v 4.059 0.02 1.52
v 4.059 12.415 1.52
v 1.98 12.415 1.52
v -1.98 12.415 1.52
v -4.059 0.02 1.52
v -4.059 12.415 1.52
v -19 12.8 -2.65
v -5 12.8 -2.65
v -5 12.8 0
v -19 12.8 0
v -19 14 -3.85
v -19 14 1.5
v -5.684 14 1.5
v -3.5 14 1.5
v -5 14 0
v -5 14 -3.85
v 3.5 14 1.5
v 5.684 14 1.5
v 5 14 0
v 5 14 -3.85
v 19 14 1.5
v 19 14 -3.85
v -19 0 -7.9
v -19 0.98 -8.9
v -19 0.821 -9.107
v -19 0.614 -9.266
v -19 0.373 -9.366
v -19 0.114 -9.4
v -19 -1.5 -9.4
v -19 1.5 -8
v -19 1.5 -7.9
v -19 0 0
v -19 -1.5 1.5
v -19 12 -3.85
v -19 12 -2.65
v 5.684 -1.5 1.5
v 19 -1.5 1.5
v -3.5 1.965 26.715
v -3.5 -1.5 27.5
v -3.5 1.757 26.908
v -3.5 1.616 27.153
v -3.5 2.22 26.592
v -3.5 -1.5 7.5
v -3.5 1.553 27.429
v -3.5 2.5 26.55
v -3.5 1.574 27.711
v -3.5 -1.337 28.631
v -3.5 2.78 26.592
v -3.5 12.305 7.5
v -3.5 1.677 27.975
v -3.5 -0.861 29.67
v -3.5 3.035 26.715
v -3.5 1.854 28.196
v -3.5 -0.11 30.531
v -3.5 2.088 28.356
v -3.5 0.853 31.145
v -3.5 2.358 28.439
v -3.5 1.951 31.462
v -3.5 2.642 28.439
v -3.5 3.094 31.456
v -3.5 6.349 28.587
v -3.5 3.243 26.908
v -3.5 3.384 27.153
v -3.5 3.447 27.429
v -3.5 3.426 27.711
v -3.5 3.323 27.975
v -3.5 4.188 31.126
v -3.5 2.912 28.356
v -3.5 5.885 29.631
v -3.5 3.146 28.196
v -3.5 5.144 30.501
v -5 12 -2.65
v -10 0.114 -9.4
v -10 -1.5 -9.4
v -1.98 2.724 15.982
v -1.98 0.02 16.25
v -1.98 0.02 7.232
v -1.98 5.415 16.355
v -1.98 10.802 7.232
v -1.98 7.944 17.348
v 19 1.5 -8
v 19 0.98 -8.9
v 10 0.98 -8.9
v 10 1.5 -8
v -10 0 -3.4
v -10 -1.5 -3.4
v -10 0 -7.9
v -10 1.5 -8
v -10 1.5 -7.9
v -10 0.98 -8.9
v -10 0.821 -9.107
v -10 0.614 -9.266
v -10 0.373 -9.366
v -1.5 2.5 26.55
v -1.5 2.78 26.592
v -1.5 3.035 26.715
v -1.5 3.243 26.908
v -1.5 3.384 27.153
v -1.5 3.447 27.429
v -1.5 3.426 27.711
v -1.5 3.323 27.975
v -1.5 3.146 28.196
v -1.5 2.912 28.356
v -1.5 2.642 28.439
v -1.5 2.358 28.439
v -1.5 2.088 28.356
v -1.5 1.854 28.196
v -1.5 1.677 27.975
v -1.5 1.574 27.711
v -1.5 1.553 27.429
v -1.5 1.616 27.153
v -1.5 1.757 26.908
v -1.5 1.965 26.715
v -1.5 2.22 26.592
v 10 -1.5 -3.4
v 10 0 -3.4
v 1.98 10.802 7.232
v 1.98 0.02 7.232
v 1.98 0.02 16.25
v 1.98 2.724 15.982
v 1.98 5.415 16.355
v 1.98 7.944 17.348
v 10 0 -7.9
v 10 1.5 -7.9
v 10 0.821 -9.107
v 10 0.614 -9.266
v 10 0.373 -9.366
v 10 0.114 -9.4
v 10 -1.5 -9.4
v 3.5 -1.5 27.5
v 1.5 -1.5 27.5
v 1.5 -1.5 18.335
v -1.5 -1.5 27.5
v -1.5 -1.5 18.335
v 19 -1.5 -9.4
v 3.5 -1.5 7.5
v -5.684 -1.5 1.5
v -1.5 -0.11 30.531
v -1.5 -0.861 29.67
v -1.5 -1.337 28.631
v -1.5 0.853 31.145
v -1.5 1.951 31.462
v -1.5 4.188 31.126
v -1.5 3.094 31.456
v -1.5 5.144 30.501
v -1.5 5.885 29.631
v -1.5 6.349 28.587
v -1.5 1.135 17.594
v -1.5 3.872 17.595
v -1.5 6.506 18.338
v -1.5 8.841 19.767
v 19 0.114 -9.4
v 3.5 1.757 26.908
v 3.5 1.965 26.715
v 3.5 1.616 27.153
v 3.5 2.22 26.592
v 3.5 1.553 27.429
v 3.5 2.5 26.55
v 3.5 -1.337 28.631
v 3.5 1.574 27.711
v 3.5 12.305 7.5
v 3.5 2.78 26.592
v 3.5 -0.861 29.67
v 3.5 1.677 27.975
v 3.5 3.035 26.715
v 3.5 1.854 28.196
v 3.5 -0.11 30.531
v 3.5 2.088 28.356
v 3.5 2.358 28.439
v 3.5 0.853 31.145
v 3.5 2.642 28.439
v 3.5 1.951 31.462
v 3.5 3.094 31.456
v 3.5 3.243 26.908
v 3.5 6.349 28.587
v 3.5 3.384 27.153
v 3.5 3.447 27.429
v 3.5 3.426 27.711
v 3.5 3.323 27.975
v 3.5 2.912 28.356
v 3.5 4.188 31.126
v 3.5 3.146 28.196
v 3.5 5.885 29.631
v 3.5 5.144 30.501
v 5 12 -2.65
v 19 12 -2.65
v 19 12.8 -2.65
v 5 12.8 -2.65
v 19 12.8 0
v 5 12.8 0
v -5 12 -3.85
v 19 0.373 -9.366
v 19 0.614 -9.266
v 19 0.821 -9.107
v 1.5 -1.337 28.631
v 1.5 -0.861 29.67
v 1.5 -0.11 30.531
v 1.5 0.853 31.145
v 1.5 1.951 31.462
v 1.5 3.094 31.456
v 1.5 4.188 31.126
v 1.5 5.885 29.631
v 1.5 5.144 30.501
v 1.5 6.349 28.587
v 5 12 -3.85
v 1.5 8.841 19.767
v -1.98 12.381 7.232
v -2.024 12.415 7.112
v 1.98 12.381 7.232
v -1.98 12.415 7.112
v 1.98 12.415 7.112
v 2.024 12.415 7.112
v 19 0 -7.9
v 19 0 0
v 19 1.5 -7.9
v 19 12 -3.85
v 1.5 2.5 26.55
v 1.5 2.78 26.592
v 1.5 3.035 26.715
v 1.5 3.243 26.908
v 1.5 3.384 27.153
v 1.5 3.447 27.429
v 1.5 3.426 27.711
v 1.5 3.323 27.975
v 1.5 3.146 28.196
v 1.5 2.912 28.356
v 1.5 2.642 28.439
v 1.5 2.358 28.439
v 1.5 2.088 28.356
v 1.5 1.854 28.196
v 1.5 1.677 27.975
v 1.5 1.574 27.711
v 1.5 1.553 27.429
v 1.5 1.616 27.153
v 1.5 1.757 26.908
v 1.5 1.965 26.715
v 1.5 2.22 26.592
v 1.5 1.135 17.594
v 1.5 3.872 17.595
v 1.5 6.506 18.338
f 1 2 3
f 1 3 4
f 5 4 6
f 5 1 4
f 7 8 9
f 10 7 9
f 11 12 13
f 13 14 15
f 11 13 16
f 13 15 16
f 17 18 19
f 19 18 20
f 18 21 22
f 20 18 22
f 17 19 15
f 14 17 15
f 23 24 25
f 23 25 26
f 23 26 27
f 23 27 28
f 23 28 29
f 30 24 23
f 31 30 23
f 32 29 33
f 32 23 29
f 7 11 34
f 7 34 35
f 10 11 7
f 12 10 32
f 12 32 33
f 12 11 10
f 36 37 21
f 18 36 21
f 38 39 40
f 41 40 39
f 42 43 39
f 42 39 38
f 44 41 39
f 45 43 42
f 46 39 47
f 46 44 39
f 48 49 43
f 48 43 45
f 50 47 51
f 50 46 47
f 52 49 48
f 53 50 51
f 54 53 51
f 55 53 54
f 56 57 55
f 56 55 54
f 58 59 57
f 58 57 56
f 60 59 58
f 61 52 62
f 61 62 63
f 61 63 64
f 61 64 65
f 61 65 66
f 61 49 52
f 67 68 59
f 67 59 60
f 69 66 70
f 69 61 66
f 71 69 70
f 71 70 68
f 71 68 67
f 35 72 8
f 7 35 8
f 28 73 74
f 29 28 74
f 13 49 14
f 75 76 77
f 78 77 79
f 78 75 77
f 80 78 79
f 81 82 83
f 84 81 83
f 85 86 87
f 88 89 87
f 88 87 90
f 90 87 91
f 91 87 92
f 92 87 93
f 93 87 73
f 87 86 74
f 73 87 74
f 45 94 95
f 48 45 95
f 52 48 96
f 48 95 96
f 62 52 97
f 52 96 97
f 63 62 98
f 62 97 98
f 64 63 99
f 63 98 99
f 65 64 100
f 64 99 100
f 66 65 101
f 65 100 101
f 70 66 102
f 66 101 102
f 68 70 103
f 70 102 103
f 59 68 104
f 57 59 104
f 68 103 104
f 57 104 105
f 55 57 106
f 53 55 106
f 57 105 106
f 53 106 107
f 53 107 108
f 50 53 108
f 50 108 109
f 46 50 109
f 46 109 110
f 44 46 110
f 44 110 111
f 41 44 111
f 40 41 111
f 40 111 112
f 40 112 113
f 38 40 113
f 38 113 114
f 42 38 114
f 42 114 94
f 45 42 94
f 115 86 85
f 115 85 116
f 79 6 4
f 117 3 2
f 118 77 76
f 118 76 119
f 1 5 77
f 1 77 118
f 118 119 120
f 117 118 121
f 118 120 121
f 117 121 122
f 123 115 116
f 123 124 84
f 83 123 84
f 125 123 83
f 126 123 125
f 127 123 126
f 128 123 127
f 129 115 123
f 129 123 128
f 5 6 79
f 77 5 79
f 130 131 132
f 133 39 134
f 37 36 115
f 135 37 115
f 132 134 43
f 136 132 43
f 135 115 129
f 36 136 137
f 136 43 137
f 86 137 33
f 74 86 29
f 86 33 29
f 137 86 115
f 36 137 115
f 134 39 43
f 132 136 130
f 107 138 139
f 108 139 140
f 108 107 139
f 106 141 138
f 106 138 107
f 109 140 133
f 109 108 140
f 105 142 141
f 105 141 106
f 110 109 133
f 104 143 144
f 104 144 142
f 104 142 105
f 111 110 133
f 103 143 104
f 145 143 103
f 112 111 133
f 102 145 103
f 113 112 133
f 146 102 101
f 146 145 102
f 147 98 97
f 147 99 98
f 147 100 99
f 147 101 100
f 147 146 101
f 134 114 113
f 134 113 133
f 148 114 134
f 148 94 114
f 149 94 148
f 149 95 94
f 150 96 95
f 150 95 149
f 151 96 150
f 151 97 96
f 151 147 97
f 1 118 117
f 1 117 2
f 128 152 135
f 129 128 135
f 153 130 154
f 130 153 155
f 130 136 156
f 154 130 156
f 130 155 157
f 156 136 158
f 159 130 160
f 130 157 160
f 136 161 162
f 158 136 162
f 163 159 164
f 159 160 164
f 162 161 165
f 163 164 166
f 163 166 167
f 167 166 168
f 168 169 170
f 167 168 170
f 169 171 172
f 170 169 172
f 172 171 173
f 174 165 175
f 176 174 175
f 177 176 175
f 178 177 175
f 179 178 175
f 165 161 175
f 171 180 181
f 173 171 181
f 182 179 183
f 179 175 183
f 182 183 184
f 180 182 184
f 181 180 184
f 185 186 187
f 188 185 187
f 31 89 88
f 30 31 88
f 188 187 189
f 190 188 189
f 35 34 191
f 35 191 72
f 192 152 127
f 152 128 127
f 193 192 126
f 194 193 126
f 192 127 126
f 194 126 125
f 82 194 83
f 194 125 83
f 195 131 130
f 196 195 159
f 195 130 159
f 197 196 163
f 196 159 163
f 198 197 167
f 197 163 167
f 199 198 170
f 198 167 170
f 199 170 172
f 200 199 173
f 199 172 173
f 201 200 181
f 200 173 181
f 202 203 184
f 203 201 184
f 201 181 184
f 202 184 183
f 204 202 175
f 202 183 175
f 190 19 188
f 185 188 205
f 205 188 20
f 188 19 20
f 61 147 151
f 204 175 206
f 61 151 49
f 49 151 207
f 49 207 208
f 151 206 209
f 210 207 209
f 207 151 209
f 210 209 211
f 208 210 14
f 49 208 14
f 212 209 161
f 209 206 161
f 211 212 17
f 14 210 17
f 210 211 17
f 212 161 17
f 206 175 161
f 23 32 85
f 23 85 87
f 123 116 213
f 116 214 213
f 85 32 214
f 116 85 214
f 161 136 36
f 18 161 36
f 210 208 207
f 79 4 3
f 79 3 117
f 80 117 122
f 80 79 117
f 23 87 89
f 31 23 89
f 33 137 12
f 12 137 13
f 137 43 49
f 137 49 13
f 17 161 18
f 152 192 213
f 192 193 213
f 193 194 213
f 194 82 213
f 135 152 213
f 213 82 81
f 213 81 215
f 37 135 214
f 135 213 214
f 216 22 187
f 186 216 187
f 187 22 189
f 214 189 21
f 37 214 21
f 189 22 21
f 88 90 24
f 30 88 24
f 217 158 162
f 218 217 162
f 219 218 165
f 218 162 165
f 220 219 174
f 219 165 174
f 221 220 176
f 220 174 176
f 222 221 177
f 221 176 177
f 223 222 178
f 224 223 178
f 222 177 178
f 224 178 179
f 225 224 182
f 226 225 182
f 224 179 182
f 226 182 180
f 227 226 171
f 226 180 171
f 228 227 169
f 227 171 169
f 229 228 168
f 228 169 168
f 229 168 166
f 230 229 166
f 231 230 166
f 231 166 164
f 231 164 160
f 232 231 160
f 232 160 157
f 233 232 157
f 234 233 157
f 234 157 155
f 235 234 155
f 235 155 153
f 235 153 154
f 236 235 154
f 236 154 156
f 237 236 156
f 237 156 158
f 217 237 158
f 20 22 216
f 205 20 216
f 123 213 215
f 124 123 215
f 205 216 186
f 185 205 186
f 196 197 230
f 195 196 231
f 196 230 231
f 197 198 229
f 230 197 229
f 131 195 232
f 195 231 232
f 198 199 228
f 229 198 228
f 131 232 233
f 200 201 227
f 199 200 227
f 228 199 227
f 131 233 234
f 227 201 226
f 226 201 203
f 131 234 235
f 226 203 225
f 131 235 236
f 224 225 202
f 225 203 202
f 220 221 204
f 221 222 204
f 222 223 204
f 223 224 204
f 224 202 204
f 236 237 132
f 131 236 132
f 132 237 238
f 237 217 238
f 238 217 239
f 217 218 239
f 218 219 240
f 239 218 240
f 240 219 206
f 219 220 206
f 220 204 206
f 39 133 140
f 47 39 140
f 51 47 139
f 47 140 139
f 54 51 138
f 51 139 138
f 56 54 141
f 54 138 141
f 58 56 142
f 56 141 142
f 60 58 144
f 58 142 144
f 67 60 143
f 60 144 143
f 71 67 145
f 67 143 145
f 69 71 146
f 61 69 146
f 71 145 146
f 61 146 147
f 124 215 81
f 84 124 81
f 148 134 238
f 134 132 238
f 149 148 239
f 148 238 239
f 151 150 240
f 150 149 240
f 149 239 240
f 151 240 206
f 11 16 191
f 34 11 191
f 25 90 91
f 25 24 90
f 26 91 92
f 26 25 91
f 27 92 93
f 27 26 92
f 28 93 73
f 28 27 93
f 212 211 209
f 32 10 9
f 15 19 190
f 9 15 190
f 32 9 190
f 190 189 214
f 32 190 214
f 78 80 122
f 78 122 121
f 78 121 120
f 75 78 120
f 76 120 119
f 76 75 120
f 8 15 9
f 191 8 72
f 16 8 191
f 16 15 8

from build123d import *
from OCP.BRepFilletAPI import BRepFilletAPI_MakeChamfer

# Parameters (mm, degrees)
EXTRUDE_1_DEPTH     = 19
CUT_EXTRUDE_1_REACH = 28.26
SKETCH_6_W          = 20
SKETCH_6_H          = 6
CHAMFER_1_SIZE      = 1.4
CHAMFER_1_SIZE2     = 0.808290377
CUT_EXTRUDE_3_REACH = 28.26
SKETCH_9_W          = 10
SKETCH_9_H          = 3.85
FILLET_4_R          = 1
EXTRUDE_4_DEPTH     = 3.5
SKETCH_11_R         = 10
CUT_EXTRUDE_4_DEPTH = 1.5
CHAMFER_2_SIZE      = 6
CHAMFER_2_SIZE_2    = 2.183821406
SHELL_START         = -1.98
SHELL_4_DEPTH       = 3.96
SHELL_START_2       = 0.02
SHELL_4_2_DEPTH     = 12.394886134
SHELL_START_3       = 12.360630137
SHELL_4_3_DEPTH     = 1.52
SKETCH_12_R         = 0.95
CUT_EXTRUDE_5_DEPTH = 42.164304926


with BuildPart() as part:
    # 草圖1 → 填料-伸長1 (new, symmetric)
    with BuildSketch(Plane(origin=(0, 0, 0), x_dir=(0, 0, -1), z_dir=(1, 0, 0))):
        Polygon((0, 12.8), (0, 0), (7.9, 0), (7.9, 1.5), (9.4, 1.5), (9.4, -1.5), (-1.5, -1.5), (-1.5, 14), (3.85, 14), (3.85, 12), (2.65, 12), (2.65, 12.8), align=None)
    extrude(amount=EXTRUDE_1_DEPTH, both=True)

    # 草圖6 → 除料-伸長1 (cut, up to next)
    with BuildSketch(Plane(origin=(0, -1.5, 0), x_dir=(1, 0, 0), z_dir=(0, 1, 0)), mode=Mode.PRIVATE) as cut_extrude_1_sk1:
        with Locations((0, 6.4)):
            Rectangle(SKETCH_6_W, SKETCH_6_H)
    cut_extrude_1_tool1 = extrude(cut_extrude_1_sk1.sketch, amount=CUT_EXTRUDE_1_REACH, mode=Mode.PRIVATE) & part.part
    add(cut_extrude_1_tool1.solids().sort_by_distance((0, -1.5, -6.4))[0], mode=Mode.SUBTRACT)

    # 導角1: one chamfer whose edges measure the first distance from different faces: ONE call of the kernel's chamfer builder (chamfer() names one face for all edges)
    chamfer_1_edges_1 = [part.edges().sort_by_distance(p)[0] for p in [
        (14.5, 1.5, -9.4),
    ]]
    chamfer_1_side_1 = [part.faces().sort_by_distance(p)[0] for p in [
        (14.5, 1.5, -8.65),
    ]]
    chamfer_1_edges_2 = [part.edges().sort_by_distance(p)[0] for p in [
        (-14.5, 1.5, -9.4),
    ]]
    chamfer_1_side_2 = [part.faces().sort_by_distance(p)[0] for p in [
        (-14.5, 1.5, -8.65),
    ]]
    chamfer_1 = BRepFilletAPI_MakeChamfer(part.part.solid().wrapped)
    for e in chamfer_1_edges_1:
        chamfer_1.Add(CHAMFER_1_SIZE, CHAMFER_1_SIZE2, e.wrapped, chamfer_1_side_1[0].wrapped)  # the first distance lies on this face
    for e in chamfer_1_edges_2:
        chamfer_1.Add(CHAMFER_1_SIZE, CHAMFER_1_SIZE2, e.wrapped, chamfer_1_side_2[0].wrapped)  # the first distance lies on this face
    add(Compound.cast(chamfer_1.Shape()), mode=Mode.REPLACE)

    # 草圖9 → 除料-伸長3 (cut, up to next)
    with BuildSketch(Plane(origin=(0, 14, 0), x_dir=(1, 0, 0), z_dir=(0, 1, 0)), mode=Mode.PRIVATE) as cut_extrude_3_sk1:
        with Locations((0, 1.925)):
            Rectangle(SKETCH_9_W, SKETCH_9_H)
    cut_extrude_3_tool1 = extrude(cut_extrude_3_sk1.sketch, amount=-CUT_EXTRUDE_3_REACH, mode=Mode.PRIVATE) & part.part
    add(cut_extrude_3_tool1.solids().sort_by_distance((0, 14, -1.925))[0], mode=Mode.SUBTRACT)

    # 圓角4
    fillet_4_edges = [part.edges().sort_by_distance(p)[0] for p in [
        (14.5, 0.691709623, -9.4),
        (-14.5, 0.691709623, -9.4),
    ]]
    fillet(fillet_4_edges, radius=FILLET_4_R)

    # 草圖10 → 填料-伸長4 (add, symmetric)
    with BuildSketch(Plane(origin=(0, 0, 0), x_dir=(0, 0, -1), z_dir=(1, 0, 0))):
        with BuildLine():
            Line((-1.5, -1.5), (-27.5, -1.5))
            ThreePointArc((-27.5, -1.5), (-31.462172303, 1.951191618), (-28.587236685, 6.34940468))
            Line((-28.587236685, 6.34940468), (-1.5, 14))
            Line((-1.5, 14), (-1.5, -1.5))
        make_face()
    extrude(amount=EXTRUDE_4_DEPTH, both=True)

    # 草圖11 → 除料-伸長4 (cut, symmetric)
    with BuildSketch(Plane(origin=(0, 0, 0), x_dir=(0, 0, -1), z_dir=(1, 0, 0))):
        with Locations((-27.5, 2.5)):
            Circle(SKETCH_11_R)
    extrude(amount=CUT_EXTRUDE_4_DEPTH, both=True, mode=Mode.SUBTRACT)

    # 導角2
    # the kernel refuses this chamfer: 6, 2.183821406 mm, written as the material it adds along each edge
    with BuildSketch(Plane(origin=(-3.5, 14, 1.5), x_dir=(0, 0, 1), z_dir=(0, -1, 0))) as chamfer_2_piece_1_section:
        Polygon((CHAMFER_2_SIZE, 0), (0, CHAMFER_2_SIZE_2), (0, 0), align=None)
    chamfer_2_piece_1 = extrude(amount=15.5, mode=Mode.PRIVATE)
    chamfer_2_piece_1 = split(chamfer_2_piece_1, bisect_by=Plane(origin=(-3.5, 14, 1.5), z_dir=(0, -0.9623511699869516, -0.2718091713403826)), keep=Keep.TOP, mode=Mode.PRIVATE)
    add(chamfer_2_piece_1)
    with BuildSketch(Plane(origin=(3.5, 14, 1.5), x_dir=(0, 0, 1), z_dir=(0, -1, 0))) as chamfer_2_piece_2_section:
        Polygon((CHAMFER_2_SIZE, 0), (0, -CHAMFER_2_SIZE_2), (0, 0), align=None)
    chamfer_2_piece_2 = extrude(amount=15.5, mode=Mode.PRIVATE)
    chamfer_2_piece_2 = split(chamfer_2_piece_2, bisect_by=Plane(origin=(3.5, 14, 1.5), z_dir=(0, -0.9623511699869516, -0.2718091713403826)), keep=Keep.TOP, mode=Mode.PRIVATE)
    add(chamfer_2_piece_2)

    # 薄殼4: read off the stored shape, not the designer's step
    # 薄殼4 outline → 薄殼4 (cut)
    with BuildSketch(Plane.YZ.offset(SHELL_START)):
        with BuildLine():
            Line((0.02, 1.52), (12.414886134, 1.52))
            Line((12.414886134, 1.52), (7.944453878, 17.347743011))
            ThreePointArc((7.944453878, 17.347743011), (4.08056814, 16.088943767), (0.02, 16.250111112))
            Line((0.02, 16.250111112), (0.02, 1.52))
        make_face()
    extrude(amount=SHELL_4_DEPTH, mode=Mode.SUBTRACT)

    # Shell 4 2 outline → Shell 4 2 (cut)
    with BuildSketch(Plane(origin=(0, 0, 0), x_dir=(1, 0, 0), z_dir=(0, 1, 0)).offset(SHELL_START_2)):
        Polygon((4.058991787, -1.52), (1.98, -1.52), (1.98, -7.231982989), align=None)
        Polygon((-1.98, -1.52), (-4.058991787, -1.52), (-1.98, -7.231982989), align=None)
    extrude(amount=SHELL_4_2_DEPTH, mode=Mode.SUBTRACT)

    # Shell 4 3 outline → Shell 4 3 (add)
    with BuildSketch(Plane(origin=(0, 0, 0), x_dir=(1, 0, 0), z_dir=(0, 0.9623511699869516, 0.2718091713403829)).offset(SHELL_START_3)):
        Polygon((4.058991787, 1.911706134), (-4.058991787, 1.911706134), (-1.98, -4.023739437), (-1.98, -14.535245358), (1.98, -14.535245358), (1.98, -4.023739437), align=None)
    extrude(amount=SHELL_4_3_DEPTH)

    # 草圖12 → 除料-伸長5 (cut, through all)
    with BuildSketch(Plane(origin=(3.5, 0, 0), x_dir=(0, 0, -1), z_dir=(1, 0, 0))):
        with Locations((-27.5, 2.5)):
            Circle(SKETCH_12_R)
    extrude(amount=-CUT_EXTRUDE_5_DEPTH, mode=Mode.SUBTRACT)


solid = part.part
